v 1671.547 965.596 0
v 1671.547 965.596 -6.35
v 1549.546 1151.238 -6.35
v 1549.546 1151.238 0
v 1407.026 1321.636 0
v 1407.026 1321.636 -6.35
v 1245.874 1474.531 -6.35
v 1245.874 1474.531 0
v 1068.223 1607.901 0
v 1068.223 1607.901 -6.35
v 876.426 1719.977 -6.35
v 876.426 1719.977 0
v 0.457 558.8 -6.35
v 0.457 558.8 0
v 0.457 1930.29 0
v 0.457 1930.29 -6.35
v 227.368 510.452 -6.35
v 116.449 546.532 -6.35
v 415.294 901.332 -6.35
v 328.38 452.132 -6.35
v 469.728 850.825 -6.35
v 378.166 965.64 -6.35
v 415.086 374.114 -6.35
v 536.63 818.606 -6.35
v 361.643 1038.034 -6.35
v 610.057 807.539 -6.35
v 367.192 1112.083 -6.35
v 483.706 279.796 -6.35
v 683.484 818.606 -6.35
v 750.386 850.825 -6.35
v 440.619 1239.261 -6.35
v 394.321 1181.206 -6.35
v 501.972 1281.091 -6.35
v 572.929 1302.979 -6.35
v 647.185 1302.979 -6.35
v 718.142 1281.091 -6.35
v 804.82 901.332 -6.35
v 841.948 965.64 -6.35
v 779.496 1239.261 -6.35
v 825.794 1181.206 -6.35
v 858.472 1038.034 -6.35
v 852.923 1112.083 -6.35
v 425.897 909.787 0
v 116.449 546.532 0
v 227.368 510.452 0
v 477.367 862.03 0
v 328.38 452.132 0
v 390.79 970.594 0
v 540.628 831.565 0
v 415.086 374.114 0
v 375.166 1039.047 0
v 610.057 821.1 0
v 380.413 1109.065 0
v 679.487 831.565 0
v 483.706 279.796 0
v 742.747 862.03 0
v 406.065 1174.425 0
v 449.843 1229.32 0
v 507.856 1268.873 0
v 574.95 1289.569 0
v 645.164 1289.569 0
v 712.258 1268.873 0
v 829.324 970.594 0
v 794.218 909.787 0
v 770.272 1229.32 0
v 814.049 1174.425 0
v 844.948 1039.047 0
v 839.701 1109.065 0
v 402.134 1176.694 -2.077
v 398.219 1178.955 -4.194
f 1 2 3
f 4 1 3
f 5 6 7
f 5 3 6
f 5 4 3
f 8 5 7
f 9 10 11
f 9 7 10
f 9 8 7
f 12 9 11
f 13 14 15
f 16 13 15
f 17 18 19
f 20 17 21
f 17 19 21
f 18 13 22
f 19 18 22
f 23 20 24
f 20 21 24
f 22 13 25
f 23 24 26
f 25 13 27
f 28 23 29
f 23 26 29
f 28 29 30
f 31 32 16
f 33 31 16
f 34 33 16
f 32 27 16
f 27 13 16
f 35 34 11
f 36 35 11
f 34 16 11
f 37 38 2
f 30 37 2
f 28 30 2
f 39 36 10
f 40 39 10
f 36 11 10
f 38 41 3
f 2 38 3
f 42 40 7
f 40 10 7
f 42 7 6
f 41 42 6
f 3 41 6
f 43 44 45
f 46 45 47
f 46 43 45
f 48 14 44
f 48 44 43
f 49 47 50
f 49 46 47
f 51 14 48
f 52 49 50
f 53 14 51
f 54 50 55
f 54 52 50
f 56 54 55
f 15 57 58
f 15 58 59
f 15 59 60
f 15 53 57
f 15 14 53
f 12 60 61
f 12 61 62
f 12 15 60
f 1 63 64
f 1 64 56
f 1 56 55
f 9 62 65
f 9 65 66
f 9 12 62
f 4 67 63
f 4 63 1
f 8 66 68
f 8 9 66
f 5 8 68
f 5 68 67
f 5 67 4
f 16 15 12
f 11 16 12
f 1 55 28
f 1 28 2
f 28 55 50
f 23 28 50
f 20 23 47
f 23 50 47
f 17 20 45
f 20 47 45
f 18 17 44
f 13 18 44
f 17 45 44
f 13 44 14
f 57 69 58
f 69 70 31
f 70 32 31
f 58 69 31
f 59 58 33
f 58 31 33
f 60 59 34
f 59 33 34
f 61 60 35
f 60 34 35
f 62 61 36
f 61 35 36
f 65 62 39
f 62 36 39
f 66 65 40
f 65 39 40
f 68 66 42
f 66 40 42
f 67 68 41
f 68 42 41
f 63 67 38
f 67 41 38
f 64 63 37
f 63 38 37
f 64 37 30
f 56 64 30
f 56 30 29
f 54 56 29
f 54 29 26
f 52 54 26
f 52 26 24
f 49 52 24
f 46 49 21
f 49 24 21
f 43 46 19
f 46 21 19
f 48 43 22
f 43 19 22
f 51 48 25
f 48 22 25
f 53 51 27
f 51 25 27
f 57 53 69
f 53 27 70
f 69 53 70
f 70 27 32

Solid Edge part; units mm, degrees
sketch "Sketch1" plane through (0, 0, 0) normal (0, 0, 1) x (1, 0, 0)
  line L0 (483.7062, 279.7959) -> (1671.5468, 965.5959)
  arc A0 (483.7062, 279.7959) -> (0.4572, 558.7998) centre (0, 0) ccw
  line L1 (0.4572, 558.7998) -> (0.4572, 1930.2902)
  line L2 (0.4572, 1930.2902) -> (876.4259, 1719.9773)
  arc A1 (876.4259, 1719.9773) -> (1671.5468, 965.5959) centre (0, 0) cw
  dimension "D1" = 1117.6
  dimension "D2" = 1930.4
  dimension "D3" = 0.4572
  dimension "D4" = 0.4572
  dimension "D5" = 25.8572
  dimension "D6" = 1168.4
extrude "Protrusion1" add sketch "Sketch1" against normal blind 6.35
sketch "Sketch2" plane through (610.0572, 1056.6501, 0) normal (0.5, 0.866, 0) x (-0.866, 0.5, 0)
  arc A0 (0, 50.8) -> (571.5, -520.7) centre (0, -520.7) cw
  line L0 (571.5, -520.7) -> (0, -520.7)
  line L1 (0, -520.7) -> (0, 50.8)
revolve "RevolvedCutout1" cut sketch "Sketch2" angle 360 about axis through (610.0572, 1056.6501, 0) along (0, 0, -1)
